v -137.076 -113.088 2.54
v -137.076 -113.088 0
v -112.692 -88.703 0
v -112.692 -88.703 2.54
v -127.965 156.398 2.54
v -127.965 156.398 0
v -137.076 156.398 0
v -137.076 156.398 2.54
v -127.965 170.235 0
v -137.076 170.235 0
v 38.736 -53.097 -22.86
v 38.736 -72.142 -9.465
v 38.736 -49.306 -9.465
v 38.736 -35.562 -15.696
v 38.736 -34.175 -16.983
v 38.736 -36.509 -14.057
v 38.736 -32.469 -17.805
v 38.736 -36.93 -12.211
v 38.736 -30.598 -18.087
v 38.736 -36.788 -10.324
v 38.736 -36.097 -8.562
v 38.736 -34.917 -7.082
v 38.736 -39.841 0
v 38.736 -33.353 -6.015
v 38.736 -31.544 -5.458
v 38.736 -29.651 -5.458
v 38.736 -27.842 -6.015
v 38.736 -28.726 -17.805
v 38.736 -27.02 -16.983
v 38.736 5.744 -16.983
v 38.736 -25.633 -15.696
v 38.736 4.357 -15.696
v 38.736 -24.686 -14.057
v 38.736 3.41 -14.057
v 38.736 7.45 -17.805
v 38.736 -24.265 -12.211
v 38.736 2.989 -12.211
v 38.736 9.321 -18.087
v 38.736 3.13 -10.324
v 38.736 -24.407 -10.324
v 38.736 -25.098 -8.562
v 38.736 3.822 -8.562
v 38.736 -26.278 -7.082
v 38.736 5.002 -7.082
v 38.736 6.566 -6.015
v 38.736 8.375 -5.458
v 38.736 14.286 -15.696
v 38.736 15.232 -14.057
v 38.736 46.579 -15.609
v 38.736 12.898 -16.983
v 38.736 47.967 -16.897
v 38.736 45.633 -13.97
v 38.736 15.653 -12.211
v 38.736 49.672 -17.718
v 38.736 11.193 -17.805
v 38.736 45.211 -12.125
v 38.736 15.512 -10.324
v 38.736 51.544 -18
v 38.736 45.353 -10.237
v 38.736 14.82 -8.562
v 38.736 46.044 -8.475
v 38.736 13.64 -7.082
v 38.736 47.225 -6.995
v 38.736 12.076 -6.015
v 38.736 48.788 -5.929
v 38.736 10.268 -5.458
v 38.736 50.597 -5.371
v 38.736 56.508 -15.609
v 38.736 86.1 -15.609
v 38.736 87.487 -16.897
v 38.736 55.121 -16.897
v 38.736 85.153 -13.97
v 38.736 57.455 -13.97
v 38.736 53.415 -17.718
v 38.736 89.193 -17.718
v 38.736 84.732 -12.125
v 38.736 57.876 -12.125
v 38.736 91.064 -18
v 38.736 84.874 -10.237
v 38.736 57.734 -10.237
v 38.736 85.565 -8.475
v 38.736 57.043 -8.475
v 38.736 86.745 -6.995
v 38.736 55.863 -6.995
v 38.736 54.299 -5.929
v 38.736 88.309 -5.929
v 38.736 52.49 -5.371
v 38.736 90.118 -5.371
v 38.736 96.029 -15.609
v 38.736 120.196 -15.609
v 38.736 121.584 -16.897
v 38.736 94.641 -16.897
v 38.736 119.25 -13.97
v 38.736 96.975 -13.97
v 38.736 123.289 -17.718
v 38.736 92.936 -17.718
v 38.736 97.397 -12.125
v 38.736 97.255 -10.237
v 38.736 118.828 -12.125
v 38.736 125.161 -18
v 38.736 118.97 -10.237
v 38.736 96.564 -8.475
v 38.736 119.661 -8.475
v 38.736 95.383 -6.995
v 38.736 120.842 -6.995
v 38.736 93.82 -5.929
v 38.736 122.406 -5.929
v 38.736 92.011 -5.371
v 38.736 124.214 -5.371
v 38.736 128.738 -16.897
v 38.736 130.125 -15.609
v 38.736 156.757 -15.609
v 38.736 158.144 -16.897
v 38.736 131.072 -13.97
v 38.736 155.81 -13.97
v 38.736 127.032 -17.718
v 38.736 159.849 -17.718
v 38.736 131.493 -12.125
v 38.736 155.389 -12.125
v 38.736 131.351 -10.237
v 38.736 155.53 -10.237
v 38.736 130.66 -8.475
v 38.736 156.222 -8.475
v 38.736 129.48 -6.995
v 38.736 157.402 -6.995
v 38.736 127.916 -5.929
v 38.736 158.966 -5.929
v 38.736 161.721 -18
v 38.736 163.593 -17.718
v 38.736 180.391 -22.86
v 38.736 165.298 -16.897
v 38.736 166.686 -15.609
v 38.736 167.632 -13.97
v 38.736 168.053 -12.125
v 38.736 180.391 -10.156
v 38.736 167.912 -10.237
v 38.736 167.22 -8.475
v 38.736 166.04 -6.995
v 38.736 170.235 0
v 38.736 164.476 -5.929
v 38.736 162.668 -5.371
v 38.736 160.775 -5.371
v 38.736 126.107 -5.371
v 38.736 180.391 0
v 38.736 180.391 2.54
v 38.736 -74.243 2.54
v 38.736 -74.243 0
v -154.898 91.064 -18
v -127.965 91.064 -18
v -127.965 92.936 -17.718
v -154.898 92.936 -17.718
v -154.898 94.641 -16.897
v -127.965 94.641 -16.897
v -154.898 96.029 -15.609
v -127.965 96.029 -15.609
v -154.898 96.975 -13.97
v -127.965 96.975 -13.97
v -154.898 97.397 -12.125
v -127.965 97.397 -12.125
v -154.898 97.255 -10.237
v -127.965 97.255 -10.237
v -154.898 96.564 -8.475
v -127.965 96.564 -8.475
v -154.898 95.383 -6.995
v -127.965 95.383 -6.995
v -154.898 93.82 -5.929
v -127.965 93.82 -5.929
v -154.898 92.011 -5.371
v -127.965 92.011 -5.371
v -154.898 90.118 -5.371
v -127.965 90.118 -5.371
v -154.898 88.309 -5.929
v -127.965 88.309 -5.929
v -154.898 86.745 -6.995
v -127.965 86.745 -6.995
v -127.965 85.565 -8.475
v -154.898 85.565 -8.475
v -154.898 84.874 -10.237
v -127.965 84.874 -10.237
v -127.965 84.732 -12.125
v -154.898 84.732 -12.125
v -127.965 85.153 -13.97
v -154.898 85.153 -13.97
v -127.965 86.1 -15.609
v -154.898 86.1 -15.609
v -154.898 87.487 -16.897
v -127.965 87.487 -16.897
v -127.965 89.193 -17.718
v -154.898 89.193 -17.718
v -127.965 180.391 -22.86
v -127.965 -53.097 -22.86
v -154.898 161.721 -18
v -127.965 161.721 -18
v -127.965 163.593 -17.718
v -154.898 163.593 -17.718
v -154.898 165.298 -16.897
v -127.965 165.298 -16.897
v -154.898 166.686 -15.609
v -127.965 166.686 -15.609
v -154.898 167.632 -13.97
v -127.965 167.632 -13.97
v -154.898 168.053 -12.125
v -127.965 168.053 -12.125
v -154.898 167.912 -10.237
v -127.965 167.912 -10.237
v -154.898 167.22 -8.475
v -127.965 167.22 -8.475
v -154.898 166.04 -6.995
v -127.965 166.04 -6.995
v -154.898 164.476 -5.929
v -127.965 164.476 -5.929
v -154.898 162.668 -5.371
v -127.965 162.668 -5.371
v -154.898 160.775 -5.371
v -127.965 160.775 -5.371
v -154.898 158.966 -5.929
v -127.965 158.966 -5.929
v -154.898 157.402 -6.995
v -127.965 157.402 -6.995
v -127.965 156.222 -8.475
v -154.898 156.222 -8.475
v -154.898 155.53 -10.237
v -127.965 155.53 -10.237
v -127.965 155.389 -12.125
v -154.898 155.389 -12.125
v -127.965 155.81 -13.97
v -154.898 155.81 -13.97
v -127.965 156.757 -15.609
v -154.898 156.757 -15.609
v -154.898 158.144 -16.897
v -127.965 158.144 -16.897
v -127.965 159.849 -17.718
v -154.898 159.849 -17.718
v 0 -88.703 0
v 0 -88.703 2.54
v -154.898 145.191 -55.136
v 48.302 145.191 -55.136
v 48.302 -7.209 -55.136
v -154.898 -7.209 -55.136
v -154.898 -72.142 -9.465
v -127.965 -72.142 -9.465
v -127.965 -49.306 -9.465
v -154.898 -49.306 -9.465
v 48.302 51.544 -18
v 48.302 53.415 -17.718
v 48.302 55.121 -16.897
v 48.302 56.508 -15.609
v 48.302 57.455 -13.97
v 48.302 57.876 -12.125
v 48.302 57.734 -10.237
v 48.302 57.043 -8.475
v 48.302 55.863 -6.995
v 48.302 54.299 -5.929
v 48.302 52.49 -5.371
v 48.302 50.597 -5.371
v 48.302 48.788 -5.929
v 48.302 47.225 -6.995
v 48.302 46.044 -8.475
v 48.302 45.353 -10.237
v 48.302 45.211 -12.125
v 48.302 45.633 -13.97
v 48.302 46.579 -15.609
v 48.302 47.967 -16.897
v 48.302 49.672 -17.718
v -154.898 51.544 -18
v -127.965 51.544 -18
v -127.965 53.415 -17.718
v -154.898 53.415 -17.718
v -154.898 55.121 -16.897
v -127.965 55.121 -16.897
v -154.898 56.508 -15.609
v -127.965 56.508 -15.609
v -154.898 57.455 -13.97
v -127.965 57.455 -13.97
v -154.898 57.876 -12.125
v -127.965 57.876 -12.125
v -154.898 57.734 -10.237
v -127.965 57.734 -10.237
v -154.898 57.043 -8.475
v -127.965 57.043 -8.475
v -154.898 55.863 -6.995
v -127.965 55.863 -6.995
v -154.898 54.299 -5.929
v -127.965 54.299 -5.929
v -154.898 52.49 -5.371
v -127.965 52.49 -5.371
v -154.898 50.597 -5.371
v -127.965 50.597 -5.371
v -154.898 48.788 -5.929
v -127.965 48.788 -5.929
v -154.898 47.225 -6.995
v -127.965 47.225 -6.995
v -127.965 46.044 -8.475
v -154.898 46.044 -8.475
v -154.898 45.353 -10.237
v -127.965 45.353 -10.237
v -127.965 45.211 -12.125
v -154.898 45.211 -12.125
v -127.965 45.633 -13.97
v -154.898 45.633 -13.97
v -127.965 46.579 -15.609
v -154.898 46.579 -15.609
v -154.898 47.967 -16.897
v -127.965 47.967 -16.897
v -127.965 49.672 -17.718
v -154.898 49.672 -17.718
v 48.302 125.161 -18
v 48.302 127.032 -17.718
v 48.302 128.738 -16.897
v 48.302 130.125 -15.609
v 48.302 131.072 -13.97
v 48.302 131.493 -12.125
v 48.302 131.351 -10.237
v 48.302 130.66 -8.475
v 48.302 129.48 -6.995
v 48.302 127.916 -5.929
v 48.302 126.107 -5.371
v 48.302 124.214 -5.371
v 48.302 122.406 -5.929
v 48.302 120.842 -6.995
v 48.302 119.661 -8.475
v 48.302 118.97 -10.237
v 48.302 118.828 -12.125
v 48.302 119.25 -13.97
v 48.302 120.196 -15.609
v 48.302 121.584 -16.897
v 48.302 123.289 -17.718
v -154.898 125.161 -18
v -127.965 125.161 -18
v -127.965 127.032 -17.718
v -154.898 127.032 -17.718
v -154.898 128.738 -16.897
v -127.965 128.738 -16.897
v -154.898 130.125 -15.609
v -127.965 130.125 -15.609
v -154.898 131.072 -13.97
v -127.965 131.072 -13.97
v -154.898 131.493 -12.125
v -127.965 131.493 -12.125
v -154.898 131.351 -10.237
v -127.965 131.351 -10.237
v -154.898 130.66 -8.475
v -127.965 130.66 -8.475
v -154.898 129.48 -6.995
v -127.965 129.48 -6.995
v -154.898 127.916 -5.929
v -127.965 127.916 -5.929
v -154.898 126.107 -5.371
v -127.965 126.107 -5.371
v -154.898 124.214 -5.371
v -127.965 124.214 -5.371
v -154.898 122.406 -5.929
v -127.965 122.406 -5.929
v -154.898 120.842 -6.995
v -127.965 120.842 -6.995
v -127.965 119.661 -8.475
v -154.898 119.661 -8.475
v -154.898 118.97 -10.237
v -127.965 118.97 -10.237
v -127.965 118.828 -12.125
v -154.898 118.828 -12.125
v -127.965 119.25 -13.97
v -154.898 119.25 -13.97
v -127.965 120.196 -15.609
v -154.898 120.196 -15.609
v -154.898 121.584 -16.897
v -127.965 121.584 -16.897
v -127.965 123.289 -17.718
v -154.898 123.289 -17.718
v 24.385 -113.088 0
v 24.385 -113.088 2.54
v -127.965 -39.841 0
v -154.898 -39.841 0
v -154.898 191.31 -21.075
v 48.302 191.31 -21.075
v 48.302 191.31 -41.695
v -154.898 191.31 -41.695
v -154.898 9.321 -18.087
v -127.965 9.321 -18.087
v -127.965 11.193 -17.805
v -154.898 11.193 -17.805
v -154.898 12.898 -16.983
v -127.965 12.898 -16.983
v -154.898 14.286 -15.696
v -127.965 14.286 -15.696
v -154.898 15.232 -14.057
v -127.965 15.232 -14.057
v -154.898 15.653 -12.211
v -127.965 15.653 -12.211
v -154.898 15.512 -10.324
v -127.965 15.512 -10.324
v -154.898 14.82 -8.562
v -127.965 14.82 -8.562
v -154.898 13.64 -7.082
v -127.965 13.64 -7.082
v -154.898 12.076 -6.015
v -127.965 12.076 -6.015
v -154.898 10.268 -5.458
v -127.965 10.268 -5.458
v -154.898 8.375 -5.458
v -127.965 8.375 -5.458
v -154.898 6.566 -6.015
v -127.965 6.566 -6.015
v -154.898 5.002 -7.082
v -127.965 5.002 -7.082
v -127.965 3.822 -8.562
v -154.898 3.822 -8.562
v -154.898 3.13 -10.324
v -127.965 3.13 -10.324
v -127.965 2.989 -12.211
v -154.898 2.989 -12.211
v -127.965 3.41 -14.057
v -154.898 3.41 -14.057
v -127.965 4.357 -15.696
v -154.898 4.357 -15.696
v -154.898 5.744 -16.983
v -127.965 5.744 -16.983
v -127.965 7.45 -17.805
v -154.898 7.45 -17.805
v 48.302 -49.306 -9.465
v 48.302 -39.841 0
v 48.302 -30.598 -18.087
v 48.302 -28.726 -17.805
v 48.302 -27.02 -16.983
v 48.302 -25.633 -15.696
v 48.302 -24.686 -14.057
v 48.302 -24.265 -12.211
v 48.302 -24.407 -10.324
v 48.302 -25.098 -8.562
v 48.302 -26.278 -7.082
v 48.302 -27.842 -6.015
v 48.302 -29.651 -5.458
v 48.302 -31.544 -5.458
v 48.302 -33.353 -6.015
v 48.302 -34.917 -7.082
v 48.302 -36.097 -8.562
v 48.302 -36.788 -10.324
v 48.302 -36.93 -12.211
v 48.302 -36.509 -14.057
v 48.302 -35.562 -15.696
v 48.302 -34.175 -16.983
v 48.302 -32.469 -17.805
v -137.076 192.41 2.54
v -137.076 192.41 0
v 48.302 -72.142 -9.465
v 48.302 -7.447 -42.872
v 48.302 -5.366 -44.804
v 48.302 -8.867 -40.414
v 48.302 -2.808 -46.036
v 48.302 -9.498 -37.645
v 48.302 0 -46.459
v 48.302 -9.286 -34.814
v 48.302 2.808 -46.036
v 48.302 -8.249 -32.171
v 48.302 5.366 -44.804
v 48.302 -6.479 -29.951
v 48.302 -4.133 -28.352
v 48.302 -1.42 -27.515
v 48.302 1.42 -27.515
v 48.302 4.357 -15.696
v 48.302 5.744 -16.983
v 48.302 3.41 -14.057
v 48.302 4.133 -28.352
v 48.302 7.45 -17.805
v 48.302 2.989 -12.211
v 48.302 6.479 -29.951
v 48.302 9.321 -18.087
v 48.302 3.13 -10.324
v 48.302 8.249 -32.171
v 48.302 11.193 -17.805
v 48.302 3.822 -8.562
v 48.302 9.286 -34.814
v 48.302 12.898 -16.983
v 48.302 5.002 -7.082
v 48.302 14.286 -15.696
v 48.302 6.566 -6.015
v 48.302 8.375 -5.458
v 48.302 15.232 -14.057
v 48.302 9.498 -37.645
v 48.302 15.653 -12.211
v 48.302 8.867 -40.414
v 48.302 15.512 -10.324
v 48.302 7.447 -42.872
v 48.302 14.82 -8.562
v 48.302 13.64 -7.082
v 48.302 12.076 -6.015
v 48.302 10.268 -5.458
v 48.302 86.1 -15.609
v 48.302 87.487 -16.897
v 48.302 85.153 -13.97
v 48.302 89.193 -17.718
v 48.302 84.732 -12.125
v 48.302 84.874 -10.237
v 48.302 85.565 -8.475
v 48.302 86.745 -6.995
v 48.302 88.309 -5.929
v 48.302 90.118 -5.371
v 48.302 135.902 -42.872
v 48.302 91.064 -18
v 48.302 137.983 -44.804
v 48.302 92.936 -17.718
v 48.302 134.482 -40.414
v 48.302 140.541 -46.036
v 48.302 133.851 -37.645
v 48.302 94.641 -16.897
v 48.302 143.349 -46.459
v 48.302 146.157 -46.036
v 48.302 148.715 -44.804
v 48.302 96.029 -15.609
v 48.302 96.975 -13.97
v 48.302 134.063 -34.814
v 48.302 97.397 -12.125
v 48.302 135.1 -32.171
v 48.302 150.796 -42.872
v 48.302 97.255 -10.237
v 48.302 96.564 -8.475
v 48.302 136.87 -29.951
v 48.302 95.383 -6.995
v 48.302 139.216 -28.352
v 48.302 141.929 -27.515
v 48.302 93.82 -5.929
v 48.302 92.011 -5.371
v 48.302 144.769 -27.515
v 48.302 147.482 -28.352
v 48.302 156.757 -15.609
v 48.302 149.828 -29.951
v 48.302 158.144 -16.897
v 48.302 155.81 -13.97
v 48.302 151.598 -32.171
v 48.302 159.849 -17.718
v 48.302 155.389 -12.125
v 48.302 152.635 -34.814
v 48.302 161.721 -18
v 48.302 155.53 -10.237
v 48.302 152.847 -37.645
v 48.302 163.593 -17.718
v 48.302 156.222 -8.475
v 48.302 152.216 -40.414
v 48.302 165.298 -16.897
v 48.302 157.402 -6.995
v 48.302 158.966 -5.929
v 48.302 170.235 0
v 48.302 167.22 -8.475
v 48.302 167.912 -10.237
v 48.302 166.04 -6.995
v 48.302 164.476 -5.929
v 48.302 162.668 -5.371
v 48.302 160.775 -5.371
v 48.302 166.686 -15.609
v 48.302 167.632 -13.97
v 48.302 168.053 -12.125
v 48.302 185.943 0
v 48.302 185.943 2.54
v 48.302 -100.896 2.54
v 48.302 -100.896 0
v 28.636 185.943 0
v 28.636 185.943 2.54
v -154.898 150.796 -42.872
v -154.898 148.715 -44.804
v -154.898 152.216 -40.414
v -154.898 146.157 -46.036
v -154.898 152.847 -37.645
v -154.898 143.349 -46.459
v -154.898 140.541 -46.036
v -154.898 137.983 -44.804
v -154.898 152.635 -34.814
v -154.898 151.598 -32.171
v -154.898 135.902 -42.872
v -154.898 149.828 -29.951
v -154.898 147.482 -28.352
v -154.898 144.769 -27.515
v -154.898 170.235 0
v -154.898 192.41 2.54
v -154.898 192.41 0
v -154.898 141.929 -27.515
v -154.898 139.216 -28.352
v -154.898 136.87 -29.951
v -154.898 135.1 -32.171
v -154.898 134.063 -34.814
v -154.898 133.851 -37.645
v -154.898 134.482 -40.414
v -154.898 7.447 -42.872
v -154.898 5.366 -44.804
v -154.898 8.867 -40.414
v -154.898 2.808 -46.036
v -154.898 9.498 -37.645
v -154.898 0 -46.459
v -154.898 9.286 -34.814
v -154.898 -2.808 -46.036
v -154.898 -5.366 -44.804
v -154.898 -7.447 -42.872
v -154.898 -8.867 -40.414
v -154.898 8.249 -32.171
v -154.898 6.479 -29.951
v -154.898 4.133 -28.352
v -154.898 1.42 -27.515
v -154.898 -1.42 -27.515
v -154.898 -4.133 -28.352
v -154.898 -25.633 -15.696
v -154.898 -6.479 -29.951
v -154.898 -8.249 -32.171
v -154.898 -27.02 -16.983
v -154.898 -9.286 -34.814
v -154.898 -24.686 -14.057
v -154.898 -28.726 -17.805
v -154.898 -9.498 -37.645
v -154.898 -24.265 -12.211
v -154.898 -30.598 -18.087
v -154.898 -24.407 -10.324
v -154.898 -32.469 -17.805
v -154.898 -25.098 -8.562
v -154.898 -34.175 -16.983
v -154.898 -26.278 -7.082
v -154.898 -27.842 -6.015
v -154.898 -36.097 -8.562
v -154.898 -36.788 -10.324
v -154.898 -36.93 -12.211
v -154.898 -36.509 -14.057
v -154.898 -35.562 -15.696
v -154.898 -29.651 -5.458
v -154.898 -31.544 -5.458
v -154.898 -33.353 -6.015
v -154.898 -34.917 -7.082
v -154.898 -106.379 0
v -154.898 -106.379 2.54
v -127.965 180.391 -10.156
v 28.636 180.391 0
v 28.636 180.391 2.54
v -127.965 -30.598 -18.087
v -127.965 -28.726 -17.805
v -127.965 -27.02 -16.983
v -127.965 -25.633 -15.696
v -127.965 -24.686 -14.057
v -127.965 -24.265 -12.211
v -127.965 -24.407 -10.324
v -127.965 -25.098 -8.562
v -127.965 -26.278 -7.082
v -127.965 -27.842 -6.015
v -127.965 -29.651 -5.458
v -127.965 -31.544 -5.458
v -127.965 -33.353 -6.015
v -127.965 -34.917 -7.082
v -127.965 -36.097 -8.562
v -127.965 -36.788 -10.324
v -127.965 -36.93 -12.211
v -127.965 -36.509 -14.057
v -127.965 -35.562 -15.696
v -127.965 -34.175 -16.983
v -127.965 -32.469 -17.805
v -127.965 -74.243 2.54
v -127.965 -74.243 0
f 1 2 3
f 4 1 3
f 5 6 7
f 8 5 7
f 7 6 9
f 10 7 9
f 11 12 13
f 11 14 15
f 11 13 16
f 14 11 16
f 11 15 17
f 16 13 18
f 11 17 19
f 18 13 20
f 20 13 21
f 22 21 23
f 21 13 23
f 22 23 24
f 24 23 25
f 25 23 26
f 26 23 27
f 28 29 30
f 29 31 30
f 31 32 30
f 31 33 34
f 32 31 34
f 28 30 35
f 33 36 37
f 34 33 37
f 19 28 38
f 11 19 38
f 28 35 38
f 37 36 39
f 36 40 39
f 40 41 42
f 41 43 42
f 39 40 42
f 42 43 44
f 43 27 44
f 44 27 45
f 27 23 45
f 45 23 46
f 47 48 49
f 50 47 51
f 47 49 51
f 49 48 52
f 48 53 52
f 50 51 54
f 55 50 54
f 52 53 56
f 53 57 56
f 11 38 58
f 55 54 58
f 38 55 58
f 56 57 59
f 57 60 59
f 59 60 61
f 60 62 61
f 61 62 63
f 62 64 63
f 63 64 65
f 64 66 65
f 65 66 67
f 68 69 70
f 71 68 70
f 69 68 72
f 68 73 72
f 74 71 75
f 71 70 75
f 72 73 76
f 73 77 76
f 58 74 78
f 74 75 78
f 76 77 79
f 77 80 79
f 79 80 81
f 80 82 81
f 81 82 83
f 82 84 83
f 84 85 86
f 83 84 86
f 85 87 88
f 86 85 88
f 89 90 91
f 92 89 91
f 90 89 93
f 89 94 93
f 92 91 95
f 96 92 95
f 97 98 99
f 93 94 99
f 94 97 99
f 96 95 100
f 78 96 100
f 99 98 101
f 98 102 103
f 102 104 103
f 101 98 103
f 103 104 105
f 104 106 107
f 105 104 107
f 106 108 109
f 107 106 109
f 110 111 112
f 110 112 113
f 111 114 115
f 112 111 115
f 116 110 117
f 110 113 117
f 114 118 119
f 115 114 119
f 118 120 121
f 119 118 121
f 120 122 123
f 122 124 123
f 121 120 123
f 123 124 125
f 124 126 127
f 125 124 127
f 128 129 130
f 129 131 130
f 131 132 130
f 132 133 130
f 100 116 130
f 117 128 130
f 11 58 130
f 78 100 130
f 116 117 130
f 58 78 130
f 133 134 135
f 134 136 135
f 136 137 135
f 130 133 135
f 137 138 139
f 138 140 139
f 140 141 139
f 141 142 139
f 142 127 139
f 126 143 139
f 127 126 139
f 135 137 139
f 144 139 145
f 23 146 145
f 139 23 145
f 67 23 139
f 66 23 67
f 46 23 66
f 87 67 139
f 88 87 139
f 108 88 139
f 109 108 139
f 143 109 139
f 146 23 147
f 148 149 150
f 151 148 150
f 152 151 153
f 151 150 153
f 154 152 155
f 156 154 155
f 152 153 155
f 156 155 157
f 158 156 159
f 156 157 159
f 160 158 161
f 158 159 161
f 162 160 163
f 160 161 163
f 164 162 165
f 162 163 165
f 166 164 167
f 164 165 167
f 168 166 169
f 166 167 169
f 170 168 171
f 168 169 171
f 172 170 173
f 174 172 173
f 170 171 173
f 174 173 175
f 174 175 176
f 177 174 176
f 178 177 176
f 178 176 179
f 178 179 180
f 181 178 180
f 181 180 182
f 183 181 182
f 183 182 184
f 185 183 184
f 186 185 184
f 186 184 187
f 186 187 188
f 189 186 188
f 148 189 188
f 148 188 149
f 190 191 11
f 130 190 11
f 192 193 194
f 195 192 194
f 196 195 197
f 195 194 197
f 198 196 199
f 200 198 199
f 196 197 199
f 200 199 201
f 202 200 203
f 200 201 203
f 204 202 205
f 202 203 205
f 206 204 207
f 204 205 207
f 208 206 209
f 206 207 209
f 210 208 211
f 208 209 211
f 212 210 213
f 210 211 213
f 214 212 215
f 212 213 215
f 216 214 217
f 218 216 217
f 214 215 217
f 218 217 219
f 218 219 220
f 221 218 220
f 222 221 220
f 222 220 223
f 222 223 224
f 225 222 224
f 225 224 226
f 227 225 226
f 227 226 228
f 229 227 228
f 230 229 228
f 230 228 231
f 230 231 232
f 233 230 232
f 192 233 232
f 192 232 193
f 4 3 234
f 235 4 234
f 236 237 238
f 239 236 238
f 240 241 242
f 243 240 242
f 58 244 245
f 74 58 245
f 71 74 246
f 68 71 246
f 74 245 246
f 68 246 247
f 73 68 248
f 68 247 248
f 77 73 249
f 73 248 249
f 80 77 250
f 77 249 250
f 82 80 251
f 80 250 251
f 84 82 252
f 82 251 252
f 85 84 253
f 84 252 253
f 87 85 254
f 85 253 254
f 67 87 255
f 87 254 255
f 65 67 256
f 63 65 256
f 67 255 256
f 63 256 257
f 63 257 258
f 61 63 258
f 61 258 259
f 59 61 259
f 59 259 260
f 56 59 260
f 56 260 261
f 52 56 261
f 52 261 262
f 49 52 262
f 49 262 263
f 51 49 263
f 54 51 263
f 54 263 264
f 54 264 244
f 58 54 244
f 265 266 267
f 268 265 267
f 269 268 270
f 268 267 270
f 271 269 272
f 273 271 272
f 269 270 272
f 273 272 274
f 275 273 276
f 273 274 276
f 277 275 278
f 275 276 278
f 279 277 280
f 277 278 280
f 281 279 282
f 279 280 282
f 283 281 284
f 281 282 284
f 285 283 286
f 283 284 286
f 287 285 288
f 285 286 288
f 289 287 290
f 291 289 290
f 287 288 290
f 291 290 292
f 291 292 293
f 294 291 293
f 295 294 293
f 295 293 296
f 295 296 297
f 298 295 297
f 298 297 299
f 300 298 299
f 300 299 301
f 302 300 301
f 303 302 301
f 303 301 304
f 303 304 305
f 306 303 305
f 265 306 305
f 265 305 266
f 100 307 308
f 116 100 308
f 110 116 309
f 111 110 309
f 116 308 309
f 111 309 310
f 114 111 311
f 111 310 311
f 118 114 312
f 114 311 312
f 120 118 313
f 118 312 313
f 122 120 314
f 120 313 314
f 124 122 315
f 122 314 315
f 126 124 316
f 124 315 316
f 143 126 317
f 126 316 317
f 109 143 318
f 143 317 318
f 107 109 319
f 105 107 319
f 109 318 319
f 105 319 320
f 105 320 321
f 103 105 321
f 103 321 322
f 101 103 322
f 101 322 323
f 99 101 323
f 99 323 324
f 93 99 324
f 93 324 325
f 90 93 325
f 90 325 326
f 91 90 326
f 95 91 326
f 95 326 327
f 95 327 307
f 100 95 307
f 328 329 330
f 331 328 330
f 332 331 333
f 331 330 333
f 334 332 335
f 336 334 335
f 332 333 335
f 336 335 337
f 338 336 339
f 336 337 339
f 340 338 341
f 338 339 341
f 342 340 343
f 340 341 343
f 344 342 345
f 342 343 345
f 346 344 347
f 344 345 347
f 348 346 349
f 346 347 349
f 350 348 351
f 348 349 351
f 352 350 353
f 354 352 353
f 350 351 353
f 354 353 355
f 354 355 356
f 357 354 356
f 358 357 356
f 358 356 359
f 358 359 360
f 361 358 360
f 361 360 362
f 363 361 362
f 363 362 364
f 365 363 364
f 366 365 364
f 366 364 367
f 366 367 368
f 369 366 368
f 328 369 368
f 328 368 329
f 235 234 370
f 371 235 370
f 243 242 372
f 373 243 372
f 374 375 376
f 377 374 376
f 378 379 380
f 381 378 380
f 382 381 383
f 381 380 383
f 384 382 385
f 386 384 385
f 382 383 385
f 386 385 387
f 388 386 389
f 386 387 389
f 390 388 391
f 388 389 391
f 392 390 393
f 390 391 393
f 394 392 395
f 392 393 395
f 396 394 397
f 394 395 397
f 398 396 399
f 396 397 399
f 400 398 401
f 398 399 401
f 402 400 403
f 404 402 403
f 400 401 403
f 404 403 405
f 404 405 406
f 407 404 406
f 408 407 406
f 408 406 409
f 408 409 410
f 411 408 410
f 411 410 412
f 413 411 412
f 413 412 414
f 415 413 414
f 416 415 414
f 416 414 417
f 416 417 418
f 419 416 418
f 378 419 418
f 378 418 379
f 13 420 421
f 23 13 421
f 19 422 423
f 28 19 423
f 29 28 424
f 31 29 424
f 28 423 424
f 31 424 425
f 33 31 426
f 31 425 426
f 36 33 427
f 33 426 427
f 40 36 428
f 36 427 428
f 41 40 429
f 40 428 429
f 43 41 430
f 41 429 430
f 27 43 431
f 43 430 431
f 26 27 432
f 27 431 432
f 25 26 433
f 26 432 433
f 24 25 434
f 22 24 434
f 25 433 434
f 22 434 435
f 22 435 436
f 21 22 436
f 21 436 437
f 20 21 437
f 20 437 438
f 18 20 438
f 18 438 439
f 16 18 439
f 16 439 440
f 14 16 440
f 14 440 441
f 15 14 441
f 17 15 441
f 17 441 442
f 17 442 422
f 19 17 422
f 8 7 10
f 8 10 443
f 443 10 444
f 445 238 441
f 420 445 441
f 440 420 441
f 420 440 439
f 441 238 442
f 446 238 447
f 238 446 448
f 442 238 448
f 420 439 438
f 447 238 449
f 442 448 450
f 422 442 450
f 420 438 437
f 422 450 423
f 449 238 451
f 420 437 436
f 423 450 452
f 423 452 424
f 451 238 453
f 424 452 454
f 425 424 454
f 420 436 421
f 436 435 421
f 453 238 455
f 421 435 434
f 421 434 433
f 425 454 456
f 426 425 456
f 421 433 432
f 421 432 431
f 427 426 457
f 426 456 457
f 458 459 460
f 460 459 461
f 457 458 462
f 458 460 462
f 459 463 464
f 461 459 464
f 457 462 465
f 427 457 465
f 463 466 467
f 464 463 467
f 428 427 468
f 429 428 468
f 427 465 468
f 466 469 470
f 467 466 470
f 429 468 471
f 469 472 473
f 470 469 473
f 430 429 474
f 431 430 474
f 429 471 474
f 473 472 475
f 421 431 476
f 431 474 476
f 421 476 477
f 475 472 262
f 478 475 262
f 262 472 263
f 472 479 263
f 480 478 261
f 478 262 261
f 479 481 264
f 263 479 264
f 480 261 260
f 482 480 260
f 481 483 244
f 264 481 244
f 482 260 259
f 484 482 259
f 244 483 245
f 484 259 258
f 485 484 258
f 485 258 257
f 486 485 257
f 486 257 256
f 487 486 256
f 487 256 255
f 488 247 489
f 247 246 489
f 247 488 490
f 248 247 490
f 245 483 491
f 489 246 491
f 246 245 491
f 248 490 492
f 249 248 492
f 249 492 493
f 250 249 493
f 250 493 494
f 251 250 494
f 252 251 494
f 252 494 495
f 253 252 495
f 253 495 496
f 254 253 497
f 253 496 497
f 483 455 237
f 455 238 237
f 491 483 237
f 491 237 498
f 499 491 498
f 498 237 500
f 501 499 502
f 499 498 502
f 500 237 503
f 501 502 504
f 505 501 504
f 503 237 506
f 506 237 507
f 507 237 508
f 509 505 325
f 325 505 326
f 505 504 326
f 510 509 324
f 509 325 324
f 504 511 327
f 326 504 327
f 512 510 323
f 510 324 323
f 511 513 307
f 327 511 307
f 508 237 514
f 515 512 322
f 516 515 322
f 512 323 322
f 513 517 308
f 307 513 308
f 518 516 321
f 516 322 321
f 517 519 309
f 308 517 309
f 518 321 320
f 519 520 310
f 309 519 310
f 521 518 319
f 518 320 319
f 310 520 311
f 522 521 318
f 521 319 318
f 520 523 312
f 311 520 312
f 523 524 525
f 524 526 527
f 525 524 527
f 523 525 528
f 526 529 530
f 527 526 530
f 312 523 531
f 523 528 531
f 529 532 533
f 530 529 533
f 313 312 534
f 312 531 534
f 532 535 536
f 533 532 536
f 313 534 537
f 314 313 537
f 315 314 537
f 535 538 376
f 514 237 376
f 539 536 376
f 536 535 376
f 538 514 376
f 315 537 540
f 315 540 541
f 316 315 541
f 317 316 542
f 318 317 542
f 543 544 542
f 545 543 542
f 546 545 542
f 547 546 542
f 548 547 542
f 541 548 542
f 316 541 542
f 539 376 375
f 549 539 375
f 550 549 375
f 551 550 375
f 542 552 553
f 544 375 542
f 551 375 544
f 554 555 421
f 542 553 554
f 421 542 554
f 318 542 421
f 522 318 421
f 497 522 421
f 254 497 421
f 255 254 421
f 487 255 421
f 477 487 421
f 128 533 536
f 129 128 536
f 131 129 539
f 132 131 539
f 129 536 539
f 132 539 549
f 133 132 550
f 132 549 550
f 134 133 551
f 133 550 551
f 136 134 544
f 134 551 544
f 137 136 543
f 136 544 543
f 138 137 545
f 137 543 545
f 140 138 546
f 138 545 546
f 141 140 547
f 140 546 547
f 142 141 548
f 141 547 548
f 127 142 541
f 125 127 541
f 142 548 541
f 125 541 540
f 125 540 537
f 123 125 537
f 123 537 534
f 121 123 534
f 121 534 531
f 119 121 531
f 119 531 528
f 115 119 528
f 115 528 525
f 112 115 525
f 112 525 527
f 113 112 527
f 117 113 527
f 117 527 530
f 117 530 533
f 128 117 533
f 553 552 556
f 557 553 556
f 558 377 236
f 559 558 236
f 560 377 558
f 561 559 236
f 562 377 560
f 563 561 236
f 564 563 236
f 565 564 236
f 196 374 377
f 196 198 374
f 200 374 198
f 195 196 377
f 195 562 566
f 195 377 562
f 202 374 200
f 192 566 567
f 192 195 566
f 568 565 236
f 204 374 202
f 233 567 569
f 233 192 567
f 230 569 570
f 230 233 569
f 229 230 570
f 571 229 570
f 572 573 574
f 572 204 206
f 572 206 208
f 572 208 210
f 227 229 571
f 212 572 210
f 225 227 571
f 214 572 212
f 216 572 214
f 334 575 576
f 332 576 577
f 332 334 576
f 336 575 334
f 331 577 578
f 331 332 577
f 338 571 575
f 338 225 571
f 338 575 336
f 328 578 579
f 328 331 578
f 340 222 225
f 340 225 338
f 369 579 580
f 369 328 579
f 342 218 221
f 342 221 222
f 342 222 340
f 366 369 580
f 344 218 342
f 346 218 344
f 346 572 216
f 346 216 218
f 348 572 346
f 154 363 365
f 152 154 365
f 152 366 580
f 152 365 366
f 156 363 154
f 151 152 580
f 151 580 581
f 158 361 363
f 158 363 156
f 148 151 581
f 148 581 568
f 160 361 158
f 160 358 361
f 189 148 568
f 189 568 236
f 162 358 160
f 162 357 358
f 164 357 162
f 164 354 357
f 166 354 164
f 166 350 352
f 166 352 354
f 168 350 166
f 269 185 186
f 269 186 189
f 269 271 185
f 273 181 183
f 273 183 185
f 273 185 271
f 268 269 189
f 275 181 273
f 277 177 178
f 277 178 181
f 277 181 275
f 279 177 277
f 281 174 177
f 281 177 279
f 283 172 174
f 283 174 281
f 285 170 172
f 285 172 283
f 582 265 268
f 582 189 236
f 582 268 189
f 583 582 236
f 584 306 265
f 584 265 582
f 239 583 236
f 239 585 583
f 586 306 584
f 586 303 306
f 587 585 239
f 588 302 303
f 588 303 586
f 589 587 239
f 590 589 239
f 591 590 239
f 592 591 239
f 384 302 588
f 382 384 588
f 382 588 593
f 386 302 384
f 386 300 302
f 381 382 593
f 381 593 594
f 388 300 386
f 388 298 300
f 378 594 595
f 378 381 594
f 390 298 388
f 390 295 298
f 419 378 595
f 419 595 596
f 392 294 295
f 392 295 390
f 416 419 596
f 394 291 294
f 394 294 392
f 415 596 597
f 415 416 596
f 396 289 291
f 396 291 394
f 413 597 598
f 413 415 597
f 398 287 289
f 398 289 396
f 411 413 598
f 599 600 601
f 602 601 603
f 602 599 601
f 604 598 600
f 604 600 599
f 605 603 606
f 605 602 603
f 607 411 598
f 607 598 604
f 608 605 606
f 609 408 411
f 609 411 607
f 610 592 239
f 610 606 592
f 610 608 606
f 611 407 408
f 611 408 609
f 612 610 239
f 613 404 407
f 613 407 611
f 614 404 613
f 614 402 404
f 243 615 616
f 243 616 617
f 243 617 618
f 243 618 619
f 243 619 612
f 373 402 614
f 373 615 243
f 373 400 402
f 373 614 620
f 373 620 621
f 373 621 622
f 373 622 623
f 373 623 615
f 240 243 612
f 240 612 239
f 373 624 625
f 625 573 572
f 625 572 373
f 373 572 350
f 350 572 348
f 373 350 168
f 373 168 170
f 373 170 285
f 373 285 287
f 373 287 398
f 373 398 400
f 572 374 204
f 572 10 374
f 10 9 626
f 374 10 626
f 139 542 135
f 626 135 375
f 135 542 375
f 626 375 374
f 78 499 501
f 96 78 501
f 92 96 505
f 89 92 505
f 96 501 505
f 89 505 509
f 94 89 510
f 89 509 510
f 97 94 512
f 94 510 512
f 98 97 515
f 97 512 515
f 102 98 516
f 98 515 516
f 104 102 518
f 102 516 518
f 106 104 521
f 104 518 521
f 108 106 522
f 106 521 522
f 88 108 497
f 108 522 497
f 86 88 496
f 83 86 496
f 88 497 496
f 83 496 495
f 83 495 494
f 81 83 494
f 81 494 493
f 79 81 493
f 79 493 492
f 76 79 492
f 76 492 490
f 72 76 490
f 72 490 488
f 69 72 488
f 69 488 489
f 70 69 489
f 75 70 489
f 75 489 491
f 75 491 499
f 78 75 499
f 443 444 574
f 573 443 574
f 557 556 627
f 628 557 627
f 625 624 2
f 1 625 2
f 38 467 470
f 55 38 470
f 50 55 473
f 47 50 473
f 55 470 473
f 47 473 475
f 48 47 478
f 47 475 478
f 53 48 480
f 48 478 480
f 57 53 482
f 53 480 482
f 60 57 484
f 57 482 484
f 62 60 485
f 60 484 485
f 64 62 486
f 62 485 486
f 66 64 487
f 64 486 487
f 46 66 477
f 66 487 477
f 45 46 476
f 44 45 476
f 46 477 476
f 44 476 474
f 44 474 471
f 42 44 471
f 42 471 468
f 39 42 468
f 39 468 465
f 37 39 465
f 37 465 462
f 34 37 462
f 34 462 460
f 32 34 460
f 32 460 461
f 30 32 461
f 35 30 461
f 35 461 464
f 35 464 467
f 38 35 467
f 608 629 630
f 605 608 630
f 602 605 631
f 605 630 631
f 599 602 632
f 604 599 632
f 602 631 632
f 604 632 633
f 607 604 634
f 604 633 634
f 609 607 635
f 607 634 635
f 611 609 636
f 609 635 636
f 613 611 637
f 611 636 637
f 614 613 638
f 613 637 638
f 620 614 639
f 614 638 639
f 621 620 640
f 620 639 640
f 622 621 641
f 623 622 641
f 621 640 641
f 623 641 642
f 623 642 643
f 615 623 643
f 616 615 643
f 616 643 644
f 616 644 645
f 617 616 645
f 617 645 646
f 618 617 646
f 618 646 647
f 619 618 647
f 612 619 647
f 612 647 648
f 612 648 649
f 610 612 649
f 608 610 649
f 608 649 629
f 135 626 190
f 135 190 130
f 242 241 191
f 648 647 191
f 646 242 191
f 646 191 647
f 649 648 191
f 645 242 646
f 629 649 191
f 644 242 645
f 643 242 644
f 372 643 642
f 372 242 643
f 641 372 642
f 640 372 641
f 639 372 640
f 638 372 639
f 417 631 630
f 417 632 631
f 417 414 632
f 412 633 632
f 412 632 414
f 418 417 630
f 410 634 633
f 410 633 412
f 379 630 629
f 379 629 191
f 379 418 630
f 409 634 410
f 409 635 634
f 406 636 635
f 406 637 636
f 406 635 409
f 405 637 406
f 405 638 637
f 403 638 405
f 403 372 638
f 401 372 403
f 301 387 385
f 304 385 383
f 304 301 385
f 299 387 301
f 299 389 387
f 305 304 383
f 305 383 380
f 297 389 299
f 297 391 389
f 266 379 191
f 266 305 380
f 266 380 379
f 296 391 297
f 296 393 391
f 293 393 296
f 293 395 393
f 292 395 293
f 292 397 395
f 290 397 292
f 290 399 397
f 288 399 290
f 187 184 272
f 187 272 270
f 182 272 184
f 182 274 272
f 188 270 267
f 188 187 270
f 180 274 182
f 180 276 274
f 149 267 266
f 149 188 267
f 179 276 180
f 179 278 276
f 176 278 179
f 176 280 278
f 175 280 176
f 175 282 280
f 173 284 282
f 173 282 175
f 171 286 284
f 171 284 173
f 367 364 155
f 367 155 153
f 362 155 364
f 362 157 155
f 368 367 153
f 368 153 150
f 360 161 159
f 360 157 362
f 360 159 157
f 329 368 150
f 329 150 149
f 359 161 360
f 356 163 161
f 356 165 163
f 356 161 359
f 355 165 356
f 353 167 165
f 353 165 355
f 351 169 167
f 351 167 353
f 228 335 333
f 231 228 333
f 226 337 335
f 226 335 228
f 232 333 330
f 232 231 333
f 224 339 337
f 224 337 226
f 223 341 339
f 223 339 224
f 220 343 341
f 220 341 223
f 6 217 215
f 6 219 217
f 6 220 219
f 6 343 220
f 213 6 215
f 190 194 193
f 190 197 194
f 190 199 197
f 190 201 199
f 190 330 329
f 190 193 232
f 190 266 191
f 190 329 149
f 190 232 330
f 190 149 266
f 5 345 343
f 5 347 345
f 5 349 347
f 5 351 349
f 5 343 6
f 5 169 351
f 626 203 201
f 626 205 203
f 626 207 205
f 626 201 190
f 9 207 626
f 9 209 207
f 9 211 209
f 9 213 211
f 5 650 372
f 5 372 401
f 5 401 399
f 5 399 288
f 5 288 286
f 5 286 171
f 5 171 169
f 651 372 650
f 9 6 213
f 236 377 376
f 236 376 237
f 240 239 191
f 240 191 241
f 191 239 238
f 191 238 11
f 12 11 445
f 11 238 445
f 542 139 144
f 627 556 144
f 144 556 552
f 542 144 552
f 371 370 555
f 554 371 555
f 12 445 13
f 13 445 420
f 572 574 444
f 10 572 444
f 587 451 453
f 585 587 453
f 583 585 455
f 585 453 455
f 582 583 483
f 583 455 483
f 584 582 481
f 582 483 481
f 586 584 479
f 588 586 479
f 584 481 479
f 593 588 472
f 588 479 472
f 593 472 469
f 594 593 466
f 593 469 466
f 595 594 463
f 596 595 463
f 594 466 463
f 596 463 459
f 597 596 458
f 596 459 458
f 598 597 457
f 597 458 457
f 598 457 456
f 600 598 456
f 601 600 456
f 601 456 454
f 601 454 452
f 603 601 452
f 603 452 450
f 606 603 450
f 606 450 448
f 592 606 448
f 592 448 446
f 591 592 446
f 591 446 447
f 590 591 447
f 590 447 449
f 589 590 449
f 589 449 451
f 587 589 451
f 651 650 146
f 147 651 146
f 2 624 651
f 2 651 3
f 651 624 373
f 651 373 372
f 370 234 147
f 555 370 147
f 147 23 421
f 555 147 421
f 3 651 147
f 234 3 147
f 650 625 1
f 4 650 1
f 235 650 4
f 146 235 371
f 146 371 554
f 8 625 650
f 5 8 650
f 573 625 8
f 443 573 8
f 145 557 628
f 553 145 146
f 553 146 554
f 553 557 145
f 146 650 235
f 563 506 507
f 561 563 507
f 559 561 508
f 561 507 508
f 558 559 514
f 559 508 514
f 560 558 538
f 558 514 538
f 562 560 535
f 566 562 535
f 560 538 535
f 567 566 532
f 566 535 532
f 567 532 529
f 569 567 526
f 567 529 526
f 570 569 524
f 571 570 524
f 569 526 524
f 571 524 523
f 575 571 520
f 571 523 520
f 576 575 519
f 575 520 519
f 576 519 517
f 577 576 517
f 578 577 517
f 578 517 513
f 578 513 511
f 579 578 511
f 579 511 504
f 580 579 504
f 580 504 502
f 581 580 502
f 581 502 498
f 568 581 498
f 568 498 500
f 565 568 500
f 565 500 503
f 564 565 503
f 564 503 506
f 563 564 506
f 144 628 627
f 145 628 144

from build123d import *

# Parameters (mm, degrees)
BOSS_EXTRUDE1_DEPTH = 2.54
BOSS_EXTRUDE2_REACH = 281.854
SKETCH3_R           = 9.525
CUT_EXTRUDE1_DEPTH  = 286.222196584
SKETCH4_R           = 6.35
CUT_EXTRUDE2_DEPTH  = 286.222196584
SKETCH5_W           = 166.701294092
SKETCH5_H           = 254.634379314
CUT_EXTRUDE3_DEPTH  = 25.4


with BuildPart() as part:
    # Sketch1 → Boss-Extrude1 (new body)
    with BuildSketch(Plane.XY):
        Polygon((-154.89754402, 192.409602109), (-154.89754402, -106.378927356), (-137.076300146, -113.087952221), (-112.691620976, -88.703273051), (0, -88.703273051), (24.38467917, -113.087952221), (48.30245598, -100.895612636), (48.30245598, -46.801532207), (48.30245598, 185.942762537), (28.636463872, 185.942762537), (28.636463872, 156.398467793), (-137.076300146, 156.398467793), (-137.076300146, 192.409602109), align=None)
    extrude(amount=BOSS_EXTRUDE1_DEPTH)

    # Boss-Extrude2: up to this face of the body (flat: up to its plane)
    boss_extrude2_end = Plane(part.part.faces().sort_by_distance((-154.89754402, 43.015337376, 1.27))[0])
    # Sketch2 → Boss-Extrude2 (add, up to the picked face)
    with BuildSketch(Plane(origin=(48.30245598, 0, 0), x_dir=(0, 0, -1), z_dir=(1, 0, 0)), mode=Mode.PRIVATE) as boss_extrude2_sk1:
        Polygon((0, 170.234631614), (21.075391445, 191.310023059), (41.695088388, 191.310023059), (55.136253414, 145.191484573), (55.136253414, -7.208515427), (9.464727664, -72.14198279), (9.464727664, -49.306219915), (0, -39.841492251), align=None)
    boss_extrude2_tool1 = split(extrude(boss_extrude2_sk1.sketch, amount=-BOSS_EXTRUDE2_REACH, mode=Mode.PRIVATE), bisect_by=boss_extrude2_end, keep=Keep.BOTH, mode=Mode.PRIVATE)
    add(boss_extrude2_tool1.solids().sort_by(Axis((48.302456, 70.213482, -26.354357), (-1, 0, 0)))[0])

    # Sketch3 → Cut-Extrude1 (cut, through all)
    with BuildSketch(Plane(origin=(48.30245598, 0, 0), x_dir=(0, 0, -1), z_dir=(1, 0, 0))):
        with Locations((36.933690773, 143.349042369)):
            Circle(SKETCH3_R)
        with Locations((36.933690773, 0)):
            Circle(SKETCH3_R)
    extrude(amount=-CUT_EXTRUDE1_DEPTH, mode=Mode.SUBTRACT)

    # Sketch4 → Cut-Extrude2 (cut, through all)
    with BuildSketch(Plane(origin=(48.30245598, 0, 0), x_dir=(0, 0, -1), z_dir=(1, 0, 0))):
        with Locations((11.650142798, 161.721177387)):
            Circle(SKETCH4_R)
        with Locations((11.736614281, 9.321201919)):
            Circle(SKETCH4_R)
        with Locations((11.650142798, 125.160679587)):
            Circle(SKETCH4_R)
        with Locations((11.650142798, 91.064352978)):
            Circle(SKETCH4_R)
        with Locations((11.650142798, 51.543610773)):
            Circle(SKETCH4_R)
        with Locations((11.736614281, -30.597539694)):
            Circle(SKETCH4_R)
    extrude(amount=-CUT_EXTRUDE2_DEPTH, mode=Mode.SUBTRACT)

    # Sketch5 → Cut-Extrude3 (cut)
    with BuildSketch(Plane.XY.offset(2.54)):
        with Locations((-44.614217323, 53.073750236)):
            Rectangle(SKETCH5_W, SKETCH5_H)
    extrude(amount=-CUT_EXTRUDE3_DEPTH, mode=Mode.SUBTRACT)


solid = part.part
